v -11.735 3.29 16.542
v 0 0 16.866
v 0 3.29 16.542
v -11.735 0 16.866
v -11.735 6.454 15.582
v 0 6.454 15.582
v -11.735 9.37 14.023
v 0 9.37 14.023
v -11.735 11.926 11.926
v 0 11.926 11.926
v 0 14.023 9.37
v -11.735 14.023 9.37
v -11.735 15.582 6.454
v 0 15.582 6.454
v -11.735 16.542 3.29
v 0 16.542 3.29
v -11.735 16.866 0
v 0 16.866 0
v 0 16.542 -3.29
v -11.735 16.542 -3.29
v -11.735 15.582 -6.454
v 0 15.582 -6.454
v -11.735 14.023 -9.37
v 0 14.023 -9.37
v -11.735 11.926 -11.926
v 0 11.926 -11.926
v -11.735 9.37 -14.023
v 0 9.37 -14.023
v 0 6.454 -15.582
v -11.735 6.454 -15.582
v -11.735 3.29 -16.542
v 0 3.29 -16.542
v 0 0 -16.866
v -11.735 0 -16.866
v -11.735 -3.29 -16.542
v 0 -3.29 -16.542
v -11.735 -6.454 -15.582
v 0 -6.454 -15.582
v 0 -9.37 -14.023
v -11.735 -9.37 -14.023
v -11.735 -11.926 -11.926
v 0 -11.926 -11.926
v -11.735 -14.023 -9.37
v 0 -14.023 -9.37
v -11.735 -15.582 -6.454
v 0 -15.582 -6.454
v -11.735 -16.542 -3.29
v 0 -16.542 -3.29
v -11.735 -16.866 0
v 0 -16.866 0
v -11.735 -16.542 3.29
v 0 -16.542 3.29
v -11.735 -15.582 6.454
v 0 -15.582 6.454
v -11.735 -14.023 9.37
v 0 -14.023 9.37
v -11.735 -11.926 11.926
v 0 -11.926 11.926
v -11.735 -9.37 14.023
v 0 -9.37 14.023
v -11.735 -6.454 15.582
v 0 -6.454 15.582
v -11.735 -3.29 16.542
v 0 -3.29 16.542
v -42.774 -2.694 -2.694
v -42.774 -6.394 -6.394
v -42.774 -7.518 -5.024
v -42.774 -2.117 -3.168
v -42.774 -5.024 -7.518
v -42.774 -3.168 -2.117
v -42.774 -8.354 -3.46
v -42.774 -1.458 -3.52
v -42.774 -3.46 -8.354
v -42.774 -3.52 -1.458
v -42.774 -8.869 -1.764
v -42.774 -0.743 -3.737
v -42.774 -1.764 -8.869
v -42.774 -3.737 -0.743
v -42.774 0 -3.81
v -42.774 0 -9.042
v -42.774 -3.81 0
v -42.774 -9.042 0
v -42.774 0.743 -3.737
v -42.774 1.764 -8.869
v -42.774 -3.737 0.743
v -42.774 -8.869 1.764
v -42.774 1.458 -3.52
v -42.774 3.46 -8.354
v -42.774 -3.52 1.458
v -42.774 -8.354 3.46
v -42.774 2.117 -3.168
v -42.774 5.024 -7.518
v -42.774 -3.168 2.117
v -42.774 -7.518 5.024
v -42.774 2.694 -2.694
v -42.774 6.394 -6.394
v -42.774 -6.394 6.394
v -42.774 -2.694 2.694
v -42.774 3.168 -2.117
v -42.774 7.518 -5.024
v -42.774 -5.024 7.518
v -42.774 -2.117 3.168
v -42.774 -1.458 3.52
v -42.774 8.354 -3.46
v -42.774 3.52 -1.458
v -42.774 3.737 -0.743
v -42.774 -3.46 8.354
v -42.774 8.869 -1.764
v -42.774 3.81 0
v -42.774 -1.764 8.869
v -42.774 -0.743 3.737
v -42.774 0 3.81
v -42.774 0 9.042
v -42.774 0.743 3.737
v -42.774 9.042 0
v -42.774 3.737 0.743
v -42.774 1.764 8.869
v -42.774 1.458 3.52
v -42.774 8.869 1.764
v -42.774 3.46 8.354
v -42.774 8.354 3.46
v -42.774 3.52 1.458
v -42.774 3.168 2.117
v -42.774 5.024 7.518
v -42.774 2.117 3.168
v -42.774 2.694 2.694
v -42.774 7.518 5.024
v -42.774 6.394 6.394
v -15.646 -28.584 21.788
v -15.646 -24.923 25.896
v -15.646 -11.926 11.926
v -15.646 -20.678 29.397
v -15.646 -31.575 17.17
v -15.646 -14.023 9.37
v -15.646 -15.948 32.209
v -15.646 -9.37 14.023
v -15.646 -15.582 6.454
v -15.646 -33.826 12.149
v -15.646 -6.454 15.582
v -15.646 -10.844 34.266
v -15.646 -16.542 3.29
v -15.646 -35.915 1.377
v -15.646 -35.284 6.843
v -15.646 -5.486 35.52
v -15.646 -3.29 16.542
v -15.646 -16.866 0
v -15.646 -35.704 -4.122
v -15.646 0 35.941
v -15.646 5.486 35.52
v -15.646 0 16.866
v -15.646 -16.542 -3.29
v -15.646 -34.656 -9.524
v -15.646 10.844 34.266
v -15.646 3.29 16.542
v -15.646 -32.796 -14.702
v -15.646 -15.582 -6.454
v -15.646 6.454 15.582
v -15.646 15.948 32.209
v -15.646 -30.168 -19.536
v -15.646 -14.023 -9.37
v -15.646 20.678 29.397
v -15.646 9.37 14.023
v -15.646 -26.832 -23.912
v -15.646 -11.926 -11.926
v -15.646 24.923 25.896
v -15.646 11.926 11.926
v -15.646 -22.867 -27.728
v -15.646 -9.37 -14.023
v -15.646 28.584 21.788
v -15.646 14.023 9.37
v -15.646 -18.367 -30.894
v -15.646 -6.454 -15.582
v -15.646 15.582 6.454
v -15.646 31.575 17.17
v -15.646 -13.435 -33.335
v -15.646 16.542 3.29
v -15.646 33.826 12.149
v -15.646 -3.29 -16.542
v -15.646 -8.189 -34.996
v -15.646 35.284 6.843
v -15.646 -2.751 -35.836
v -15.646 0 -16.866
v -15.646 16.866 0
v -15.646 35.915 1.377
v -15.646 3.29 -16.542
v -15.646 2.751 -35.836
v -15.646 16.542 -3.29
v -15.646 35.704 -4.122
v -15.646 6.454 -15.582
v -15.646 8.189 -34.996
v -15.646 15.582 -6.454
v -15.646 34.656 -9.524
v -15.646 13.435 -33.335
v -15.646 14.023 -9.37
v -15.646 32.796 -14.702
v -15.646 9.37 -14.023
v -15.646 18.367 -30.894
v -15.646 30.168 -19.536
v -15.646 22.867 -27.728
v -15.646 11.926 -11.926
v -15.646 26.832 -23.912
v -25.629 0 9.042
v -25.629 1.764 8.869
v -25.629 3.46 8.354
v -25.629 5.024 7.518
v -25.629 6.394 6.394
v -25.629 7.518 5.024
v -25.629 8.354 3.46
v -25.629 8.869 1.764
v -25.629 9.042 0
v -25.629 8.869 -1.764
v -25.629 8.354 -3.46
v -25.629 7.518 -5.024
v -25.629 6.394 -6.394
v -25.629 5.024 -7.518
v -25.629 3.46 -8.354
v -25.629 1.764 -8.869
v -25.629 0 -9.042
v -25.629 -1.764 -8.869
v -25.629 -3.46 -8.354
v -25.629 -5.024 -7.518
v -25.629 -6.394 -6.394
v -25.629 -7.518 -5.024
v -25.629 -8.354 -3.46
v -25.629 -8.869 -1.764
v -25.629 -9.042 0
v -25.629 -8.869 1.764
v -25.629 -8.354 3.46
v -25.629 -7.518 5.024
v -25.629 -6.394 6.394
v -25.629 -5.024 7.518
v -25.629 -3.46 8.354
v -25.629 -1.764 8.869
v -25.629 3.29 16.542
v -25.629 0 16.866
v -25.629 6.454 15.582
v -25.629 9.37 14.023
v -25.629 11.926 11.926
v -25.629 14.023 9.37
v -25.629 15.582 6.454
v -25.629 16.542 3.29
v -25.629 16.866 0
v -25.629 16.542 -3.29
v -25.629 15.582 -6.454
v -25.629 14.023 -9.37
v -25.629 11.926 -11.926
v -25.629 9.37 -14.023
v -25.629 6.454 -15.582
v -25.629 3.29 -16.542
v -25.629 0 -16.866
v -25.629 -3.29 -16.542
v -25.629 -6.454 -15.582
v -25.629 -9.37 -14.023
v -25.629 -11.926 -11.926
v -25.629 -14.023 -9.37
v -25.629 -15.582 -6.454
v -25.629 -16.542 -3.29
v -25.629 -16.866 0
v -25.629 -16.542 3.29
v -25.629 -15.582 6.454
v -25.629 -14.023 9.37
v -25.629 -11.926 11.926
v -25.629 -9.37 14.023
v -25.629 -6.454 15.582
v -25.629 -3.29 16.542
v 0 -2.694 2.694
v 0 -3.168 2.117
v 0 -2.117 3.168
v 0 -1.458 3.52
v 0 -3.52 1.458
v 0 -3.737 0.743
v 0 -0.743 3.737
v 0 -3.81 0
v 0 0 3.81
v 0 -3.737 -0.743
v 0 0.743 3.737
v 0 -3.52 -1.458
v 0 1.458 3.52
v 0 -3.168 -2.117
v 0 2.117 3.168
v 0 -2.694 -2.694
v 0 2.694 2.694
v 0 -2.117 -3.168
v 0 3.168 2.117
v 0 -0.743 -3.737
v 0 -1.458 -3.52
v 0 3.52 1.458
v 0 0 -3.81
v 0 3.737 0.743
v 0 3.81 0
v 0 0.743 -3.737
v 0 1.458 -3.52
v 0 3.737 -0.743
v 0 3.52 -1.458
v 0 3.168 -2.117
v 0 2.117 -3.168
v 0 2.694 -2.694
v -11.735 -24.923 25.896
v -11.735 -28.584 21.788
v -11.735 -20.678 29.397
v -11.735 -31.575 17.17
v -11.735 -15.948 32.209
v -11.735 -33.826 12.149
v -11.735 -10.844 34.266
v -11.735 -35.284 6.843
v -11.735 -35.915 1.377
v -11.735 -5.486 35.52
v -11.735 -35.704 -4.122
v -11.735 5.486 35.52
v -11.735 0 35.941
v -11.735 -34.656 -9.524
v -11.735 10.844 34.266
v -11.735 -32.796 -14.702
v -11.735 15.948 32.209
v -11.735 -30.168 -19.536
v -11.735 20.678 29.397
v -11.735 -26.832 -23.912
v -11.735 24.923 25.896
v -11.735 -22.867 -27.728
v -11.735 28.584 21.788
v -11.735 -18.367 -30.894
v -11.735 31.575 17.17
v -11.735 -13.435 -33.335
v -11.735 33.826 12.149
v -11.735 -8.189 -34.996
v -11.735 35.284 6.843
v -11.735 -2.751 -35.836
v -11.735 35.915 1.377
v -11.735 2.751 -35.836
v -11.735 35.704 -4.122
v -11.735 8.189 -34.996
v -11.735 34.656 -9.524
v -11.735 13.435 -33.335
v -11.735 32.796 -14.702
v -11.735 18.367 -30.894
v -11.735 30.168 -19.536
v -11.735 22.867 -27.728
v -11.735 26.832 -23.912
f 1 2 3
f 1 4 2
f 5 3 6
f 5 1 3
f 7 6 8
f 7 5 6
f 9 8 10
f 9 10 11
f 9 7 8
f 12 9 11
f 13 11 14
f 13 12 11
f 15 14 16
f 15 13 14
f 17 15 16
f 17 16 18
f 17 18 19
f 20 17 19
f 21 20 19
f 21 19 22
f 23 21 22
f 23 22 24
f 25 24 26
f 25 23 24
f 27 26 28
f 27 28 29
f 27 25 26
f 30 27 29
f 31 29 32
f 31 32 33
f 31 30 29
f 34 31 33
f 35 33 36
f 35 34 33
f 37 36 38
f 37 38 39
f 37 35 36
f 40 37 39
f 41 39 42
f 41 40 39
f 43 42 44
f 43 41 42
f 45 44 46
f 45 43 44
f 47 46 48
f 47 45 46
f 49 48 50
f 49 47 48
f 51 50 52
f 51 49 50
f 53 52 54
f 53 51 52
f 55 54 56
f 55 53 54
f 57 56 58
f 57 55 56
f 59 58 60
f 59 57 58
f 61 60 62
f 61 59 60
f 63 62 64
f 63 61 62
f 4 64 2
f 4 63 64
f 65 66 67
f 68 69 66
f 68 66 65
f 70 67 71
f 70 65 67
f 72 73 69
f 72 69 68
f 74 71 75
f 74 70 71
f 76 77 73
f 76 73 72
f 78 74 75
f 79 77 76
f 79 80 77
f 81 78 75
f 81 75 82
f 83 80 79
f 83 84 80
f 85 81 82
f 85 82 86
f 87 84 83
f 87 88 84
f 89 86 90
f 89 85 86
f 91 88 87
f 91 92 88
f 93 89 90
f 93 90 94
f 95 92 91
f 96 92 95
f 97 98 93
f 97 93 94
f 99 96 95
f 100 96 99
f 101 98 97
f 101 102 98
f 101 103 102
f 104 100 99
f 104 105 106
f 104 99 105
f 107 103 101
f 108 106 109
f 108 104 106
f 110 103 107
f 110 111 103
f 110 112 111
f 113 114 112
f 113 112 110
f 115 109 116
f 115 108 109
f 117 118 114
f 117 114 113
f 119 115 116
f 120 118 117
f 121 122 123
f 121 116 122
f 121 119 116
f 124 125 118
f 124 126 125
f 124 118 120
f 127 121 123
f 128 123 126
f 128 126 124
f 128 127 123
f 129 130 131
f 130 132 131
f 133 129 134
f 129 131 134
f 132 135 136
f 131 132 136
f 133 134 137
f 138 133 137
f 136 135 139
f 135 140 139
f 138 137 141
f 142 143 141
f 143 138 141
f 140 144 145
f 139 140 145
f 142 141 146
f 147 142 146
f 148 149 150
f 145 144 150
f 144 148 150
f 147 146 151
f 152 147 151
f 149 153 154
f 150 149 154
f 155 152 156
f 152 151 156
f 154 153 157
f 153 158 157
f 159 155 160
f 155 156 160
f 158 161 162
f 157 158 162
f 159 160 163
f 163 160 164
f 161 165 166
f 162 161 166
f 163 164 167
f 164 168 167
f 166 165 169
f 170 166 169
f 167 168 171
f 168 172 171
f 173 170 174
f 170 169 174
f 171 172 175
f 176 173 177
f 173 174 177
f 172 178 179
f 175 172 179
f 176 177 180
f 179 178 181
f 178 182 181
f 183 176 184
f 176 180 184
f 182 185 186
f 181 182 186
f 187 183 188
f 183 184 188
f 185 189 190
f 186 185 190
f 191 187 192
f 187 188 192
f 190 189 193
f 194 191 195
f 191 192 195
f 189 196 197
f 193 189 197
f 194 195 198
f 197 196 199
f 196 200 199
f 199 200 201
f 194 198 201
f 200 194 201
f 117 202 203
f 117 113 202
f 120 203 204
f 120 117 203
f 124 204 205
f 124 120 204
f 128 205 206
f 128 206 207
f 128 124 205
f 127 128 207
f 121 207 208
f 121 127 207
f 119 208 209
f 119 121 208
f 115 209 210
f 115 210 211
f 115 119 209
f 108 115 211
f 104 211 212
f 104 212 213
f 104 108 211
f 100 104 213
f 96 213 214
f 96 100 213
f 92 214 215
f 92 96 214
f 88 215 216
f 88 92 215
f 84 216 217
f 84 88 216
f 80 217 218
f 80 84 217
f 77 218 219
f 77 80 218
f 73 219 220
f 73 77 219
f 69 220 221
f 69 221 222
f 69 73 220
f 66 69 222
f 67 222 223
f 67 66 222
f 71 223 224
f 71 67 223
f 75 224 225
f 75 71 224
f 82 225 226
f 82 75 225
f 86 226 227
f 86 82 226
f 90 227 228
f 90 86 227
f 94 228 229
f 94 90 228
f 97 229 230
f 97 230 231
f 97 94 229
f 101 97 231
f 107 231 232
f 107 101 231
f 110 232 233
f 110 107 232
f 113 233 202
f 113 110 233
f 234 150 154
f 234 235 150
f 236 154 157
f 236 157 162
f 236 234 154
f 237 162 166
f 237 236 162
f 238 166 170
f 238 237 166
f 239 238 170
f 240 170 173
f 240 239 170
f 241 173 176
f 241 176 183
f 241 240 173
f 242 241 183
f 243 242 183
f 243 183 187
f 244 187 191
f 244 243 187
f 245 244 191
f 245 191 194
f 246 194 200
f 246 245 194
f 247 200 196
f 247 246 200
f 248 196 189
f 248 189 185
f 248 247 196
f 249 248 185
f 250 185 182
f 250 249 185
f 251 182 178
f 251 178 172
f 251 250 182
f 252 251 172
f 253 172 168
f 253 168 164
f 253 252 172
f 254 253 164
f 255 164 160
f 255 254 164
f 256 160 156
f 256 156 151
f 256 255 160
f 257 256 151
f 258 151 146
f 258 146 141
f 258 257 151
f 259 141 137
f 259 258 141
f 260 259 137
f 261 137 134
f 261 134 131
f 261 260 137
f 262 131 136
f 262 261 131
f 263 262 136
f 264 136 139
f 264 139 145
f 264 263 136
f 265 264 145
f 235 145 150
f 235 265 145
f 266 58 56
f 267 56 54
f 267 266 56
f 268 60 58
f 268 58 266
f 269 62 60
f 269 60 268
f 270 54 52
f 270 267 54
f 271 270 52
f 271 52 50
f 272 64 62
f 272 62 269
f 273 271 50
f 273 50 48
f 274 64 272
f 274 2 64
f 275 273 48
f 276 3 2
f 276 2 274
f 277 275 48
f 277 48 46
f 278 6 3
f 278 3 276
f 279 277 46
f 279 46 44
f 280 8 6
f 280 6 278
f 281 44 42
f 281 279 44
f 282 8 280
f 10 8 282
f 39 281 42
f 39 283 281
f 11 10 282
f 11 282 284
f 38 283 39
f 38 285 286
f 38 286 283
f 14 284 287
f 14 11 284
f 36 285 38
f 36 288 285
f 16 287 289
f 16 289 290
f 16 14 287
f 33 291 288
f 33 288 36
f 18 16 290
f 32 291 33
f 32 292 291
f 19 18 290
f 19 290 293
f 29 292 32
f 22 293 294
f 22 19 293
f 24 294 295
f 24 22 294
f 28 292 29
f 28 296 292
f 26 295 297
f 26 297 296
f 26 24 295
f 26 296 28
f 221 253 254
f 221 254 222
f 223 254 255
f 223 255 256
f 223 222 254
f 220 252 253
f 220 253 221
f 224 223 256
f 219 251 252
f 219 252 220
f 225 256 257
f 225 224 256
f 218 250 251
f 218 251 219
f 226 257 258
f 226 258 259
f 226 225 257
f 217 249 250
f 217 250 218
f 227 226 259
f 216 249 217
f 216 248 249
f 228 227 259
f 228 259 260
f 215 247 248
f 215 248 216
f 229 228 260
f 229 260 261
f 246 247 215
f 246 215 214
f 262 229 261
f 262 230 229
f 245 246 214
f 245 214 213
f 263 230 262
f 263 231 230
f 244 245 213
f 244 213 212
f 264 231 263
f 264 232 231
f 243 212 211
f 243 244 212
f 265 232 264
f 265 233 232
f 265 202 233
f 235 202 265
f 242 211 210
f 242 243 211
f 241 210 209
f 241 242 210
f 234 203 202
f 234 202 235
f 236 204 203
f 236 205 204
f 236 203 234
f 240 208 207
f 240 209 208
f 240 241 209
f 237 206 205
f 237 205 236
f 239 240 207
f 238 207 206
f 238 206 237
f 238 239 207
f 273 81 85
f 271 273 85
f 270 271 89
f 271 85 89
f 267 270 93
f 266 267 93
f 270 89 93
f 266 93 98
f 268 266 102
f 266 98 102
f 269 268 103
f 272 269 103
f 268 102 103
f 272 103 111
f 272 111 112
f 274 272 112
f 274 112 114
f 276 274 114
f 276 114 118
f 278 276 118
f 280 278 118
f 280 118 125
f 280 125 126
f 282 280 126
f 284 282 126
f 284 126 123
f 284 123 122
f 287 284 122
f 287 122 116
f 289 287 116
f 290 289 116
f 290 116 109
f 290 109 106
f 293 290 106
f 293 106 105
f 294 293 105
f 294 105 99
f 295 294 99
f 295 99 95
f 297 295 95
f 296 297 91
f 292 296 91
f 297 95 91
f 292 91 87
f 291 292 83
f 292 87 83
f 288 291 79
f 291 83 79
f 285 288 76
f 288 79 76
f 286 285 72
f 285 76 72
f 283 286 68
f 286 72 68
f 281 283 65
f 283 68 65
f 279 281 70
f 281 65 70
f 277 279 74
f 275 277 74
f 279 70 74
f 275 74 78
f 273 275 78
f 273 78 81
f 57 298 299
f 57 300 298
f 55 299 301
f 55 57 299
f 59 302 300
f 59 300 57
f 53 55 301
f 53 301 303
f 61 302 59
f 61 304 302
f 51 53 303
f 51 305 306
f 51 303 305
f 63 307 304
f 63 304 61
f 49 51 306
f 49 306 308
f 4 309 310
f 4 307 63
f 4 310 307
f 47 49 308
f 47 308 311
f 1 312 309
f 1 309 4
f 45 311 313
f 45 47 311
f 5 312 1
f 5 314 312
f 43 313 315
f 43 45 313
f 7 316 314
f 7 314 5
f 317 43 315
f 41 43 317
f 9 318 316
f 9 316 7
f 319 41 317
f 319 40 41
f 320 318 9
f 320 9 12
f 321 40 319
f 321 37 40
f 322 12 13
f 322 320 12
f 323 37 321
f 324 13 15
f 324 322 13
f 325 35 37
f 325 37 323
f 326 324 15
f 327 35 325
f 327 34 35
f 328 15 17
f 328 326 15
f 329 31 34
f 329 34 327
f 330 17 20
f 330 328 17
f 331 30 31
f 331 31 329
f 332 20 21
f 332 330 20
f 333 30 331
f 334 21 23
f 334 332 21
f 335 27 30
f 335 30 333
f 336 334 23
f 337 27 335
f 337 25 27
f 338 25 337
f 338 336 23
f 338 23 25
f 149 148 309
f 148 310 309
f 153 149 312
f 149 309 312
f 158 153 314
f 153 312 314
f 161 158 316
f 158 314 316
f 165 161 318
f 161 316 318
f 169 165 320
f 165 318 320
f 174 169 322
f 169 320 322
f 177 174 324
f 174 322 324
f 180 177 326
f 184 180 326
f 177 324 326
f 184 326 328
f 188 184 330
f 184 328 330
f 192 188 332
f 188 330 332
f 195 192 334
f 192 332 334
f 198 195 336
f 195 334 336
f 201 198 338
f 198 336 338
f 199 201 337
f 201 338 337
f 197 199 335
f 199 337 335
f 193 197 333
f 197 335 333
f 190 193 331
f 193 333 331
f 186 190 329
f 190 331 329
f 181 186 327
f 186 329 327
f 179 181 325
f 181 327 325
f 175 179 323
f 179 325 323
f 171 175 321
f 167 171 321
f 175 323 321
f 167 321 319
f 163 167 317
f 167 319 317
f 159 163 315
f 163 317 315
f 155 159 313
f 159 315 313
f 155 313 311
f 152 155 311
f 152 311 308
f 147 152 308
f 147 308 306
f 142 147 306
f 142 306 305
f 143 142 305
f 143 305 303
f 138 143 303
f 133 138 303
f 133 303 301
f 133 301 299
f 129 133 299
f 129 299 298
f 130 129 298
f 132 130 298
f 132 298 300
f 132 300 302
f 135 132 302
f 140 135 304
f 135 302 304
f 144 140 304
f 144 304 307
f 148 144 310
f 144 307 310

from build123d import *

# Parameters (mm, degrees)
F0_W = 3.9116
F0_H = 19.0754
F3_D = 7.62


with BuildPart() as f1:
    # F0 (on Front) → F1 (revolve)
    with BuildSketch(Plane.XZ):
        Polygon((-42.7736, 0), (0, 0), (0, 9.0424), (-25.6286, 9.0424), (-42.7736, 9.0424), align=None)
        Polygon((-25.6286, 9.0424), (0, 9.0424), (0, 16.8656), (-11.7348, 16.8656), (-15.6464, 16.8656), (-25.6286, 16.8656), align=None)
        with Locations((-13.6906, 26.4033)):
            Rectangle(F0_W, F0_H)
    revolve(axis=Axis((-21.3868, 0, 0), (-1, 0, 0)))

    # F3 (through all)
    with Locations(Plane.YZ):
        with Locations((0, 0)):
            Hole(F3_D / 2)


solid = f1.part
